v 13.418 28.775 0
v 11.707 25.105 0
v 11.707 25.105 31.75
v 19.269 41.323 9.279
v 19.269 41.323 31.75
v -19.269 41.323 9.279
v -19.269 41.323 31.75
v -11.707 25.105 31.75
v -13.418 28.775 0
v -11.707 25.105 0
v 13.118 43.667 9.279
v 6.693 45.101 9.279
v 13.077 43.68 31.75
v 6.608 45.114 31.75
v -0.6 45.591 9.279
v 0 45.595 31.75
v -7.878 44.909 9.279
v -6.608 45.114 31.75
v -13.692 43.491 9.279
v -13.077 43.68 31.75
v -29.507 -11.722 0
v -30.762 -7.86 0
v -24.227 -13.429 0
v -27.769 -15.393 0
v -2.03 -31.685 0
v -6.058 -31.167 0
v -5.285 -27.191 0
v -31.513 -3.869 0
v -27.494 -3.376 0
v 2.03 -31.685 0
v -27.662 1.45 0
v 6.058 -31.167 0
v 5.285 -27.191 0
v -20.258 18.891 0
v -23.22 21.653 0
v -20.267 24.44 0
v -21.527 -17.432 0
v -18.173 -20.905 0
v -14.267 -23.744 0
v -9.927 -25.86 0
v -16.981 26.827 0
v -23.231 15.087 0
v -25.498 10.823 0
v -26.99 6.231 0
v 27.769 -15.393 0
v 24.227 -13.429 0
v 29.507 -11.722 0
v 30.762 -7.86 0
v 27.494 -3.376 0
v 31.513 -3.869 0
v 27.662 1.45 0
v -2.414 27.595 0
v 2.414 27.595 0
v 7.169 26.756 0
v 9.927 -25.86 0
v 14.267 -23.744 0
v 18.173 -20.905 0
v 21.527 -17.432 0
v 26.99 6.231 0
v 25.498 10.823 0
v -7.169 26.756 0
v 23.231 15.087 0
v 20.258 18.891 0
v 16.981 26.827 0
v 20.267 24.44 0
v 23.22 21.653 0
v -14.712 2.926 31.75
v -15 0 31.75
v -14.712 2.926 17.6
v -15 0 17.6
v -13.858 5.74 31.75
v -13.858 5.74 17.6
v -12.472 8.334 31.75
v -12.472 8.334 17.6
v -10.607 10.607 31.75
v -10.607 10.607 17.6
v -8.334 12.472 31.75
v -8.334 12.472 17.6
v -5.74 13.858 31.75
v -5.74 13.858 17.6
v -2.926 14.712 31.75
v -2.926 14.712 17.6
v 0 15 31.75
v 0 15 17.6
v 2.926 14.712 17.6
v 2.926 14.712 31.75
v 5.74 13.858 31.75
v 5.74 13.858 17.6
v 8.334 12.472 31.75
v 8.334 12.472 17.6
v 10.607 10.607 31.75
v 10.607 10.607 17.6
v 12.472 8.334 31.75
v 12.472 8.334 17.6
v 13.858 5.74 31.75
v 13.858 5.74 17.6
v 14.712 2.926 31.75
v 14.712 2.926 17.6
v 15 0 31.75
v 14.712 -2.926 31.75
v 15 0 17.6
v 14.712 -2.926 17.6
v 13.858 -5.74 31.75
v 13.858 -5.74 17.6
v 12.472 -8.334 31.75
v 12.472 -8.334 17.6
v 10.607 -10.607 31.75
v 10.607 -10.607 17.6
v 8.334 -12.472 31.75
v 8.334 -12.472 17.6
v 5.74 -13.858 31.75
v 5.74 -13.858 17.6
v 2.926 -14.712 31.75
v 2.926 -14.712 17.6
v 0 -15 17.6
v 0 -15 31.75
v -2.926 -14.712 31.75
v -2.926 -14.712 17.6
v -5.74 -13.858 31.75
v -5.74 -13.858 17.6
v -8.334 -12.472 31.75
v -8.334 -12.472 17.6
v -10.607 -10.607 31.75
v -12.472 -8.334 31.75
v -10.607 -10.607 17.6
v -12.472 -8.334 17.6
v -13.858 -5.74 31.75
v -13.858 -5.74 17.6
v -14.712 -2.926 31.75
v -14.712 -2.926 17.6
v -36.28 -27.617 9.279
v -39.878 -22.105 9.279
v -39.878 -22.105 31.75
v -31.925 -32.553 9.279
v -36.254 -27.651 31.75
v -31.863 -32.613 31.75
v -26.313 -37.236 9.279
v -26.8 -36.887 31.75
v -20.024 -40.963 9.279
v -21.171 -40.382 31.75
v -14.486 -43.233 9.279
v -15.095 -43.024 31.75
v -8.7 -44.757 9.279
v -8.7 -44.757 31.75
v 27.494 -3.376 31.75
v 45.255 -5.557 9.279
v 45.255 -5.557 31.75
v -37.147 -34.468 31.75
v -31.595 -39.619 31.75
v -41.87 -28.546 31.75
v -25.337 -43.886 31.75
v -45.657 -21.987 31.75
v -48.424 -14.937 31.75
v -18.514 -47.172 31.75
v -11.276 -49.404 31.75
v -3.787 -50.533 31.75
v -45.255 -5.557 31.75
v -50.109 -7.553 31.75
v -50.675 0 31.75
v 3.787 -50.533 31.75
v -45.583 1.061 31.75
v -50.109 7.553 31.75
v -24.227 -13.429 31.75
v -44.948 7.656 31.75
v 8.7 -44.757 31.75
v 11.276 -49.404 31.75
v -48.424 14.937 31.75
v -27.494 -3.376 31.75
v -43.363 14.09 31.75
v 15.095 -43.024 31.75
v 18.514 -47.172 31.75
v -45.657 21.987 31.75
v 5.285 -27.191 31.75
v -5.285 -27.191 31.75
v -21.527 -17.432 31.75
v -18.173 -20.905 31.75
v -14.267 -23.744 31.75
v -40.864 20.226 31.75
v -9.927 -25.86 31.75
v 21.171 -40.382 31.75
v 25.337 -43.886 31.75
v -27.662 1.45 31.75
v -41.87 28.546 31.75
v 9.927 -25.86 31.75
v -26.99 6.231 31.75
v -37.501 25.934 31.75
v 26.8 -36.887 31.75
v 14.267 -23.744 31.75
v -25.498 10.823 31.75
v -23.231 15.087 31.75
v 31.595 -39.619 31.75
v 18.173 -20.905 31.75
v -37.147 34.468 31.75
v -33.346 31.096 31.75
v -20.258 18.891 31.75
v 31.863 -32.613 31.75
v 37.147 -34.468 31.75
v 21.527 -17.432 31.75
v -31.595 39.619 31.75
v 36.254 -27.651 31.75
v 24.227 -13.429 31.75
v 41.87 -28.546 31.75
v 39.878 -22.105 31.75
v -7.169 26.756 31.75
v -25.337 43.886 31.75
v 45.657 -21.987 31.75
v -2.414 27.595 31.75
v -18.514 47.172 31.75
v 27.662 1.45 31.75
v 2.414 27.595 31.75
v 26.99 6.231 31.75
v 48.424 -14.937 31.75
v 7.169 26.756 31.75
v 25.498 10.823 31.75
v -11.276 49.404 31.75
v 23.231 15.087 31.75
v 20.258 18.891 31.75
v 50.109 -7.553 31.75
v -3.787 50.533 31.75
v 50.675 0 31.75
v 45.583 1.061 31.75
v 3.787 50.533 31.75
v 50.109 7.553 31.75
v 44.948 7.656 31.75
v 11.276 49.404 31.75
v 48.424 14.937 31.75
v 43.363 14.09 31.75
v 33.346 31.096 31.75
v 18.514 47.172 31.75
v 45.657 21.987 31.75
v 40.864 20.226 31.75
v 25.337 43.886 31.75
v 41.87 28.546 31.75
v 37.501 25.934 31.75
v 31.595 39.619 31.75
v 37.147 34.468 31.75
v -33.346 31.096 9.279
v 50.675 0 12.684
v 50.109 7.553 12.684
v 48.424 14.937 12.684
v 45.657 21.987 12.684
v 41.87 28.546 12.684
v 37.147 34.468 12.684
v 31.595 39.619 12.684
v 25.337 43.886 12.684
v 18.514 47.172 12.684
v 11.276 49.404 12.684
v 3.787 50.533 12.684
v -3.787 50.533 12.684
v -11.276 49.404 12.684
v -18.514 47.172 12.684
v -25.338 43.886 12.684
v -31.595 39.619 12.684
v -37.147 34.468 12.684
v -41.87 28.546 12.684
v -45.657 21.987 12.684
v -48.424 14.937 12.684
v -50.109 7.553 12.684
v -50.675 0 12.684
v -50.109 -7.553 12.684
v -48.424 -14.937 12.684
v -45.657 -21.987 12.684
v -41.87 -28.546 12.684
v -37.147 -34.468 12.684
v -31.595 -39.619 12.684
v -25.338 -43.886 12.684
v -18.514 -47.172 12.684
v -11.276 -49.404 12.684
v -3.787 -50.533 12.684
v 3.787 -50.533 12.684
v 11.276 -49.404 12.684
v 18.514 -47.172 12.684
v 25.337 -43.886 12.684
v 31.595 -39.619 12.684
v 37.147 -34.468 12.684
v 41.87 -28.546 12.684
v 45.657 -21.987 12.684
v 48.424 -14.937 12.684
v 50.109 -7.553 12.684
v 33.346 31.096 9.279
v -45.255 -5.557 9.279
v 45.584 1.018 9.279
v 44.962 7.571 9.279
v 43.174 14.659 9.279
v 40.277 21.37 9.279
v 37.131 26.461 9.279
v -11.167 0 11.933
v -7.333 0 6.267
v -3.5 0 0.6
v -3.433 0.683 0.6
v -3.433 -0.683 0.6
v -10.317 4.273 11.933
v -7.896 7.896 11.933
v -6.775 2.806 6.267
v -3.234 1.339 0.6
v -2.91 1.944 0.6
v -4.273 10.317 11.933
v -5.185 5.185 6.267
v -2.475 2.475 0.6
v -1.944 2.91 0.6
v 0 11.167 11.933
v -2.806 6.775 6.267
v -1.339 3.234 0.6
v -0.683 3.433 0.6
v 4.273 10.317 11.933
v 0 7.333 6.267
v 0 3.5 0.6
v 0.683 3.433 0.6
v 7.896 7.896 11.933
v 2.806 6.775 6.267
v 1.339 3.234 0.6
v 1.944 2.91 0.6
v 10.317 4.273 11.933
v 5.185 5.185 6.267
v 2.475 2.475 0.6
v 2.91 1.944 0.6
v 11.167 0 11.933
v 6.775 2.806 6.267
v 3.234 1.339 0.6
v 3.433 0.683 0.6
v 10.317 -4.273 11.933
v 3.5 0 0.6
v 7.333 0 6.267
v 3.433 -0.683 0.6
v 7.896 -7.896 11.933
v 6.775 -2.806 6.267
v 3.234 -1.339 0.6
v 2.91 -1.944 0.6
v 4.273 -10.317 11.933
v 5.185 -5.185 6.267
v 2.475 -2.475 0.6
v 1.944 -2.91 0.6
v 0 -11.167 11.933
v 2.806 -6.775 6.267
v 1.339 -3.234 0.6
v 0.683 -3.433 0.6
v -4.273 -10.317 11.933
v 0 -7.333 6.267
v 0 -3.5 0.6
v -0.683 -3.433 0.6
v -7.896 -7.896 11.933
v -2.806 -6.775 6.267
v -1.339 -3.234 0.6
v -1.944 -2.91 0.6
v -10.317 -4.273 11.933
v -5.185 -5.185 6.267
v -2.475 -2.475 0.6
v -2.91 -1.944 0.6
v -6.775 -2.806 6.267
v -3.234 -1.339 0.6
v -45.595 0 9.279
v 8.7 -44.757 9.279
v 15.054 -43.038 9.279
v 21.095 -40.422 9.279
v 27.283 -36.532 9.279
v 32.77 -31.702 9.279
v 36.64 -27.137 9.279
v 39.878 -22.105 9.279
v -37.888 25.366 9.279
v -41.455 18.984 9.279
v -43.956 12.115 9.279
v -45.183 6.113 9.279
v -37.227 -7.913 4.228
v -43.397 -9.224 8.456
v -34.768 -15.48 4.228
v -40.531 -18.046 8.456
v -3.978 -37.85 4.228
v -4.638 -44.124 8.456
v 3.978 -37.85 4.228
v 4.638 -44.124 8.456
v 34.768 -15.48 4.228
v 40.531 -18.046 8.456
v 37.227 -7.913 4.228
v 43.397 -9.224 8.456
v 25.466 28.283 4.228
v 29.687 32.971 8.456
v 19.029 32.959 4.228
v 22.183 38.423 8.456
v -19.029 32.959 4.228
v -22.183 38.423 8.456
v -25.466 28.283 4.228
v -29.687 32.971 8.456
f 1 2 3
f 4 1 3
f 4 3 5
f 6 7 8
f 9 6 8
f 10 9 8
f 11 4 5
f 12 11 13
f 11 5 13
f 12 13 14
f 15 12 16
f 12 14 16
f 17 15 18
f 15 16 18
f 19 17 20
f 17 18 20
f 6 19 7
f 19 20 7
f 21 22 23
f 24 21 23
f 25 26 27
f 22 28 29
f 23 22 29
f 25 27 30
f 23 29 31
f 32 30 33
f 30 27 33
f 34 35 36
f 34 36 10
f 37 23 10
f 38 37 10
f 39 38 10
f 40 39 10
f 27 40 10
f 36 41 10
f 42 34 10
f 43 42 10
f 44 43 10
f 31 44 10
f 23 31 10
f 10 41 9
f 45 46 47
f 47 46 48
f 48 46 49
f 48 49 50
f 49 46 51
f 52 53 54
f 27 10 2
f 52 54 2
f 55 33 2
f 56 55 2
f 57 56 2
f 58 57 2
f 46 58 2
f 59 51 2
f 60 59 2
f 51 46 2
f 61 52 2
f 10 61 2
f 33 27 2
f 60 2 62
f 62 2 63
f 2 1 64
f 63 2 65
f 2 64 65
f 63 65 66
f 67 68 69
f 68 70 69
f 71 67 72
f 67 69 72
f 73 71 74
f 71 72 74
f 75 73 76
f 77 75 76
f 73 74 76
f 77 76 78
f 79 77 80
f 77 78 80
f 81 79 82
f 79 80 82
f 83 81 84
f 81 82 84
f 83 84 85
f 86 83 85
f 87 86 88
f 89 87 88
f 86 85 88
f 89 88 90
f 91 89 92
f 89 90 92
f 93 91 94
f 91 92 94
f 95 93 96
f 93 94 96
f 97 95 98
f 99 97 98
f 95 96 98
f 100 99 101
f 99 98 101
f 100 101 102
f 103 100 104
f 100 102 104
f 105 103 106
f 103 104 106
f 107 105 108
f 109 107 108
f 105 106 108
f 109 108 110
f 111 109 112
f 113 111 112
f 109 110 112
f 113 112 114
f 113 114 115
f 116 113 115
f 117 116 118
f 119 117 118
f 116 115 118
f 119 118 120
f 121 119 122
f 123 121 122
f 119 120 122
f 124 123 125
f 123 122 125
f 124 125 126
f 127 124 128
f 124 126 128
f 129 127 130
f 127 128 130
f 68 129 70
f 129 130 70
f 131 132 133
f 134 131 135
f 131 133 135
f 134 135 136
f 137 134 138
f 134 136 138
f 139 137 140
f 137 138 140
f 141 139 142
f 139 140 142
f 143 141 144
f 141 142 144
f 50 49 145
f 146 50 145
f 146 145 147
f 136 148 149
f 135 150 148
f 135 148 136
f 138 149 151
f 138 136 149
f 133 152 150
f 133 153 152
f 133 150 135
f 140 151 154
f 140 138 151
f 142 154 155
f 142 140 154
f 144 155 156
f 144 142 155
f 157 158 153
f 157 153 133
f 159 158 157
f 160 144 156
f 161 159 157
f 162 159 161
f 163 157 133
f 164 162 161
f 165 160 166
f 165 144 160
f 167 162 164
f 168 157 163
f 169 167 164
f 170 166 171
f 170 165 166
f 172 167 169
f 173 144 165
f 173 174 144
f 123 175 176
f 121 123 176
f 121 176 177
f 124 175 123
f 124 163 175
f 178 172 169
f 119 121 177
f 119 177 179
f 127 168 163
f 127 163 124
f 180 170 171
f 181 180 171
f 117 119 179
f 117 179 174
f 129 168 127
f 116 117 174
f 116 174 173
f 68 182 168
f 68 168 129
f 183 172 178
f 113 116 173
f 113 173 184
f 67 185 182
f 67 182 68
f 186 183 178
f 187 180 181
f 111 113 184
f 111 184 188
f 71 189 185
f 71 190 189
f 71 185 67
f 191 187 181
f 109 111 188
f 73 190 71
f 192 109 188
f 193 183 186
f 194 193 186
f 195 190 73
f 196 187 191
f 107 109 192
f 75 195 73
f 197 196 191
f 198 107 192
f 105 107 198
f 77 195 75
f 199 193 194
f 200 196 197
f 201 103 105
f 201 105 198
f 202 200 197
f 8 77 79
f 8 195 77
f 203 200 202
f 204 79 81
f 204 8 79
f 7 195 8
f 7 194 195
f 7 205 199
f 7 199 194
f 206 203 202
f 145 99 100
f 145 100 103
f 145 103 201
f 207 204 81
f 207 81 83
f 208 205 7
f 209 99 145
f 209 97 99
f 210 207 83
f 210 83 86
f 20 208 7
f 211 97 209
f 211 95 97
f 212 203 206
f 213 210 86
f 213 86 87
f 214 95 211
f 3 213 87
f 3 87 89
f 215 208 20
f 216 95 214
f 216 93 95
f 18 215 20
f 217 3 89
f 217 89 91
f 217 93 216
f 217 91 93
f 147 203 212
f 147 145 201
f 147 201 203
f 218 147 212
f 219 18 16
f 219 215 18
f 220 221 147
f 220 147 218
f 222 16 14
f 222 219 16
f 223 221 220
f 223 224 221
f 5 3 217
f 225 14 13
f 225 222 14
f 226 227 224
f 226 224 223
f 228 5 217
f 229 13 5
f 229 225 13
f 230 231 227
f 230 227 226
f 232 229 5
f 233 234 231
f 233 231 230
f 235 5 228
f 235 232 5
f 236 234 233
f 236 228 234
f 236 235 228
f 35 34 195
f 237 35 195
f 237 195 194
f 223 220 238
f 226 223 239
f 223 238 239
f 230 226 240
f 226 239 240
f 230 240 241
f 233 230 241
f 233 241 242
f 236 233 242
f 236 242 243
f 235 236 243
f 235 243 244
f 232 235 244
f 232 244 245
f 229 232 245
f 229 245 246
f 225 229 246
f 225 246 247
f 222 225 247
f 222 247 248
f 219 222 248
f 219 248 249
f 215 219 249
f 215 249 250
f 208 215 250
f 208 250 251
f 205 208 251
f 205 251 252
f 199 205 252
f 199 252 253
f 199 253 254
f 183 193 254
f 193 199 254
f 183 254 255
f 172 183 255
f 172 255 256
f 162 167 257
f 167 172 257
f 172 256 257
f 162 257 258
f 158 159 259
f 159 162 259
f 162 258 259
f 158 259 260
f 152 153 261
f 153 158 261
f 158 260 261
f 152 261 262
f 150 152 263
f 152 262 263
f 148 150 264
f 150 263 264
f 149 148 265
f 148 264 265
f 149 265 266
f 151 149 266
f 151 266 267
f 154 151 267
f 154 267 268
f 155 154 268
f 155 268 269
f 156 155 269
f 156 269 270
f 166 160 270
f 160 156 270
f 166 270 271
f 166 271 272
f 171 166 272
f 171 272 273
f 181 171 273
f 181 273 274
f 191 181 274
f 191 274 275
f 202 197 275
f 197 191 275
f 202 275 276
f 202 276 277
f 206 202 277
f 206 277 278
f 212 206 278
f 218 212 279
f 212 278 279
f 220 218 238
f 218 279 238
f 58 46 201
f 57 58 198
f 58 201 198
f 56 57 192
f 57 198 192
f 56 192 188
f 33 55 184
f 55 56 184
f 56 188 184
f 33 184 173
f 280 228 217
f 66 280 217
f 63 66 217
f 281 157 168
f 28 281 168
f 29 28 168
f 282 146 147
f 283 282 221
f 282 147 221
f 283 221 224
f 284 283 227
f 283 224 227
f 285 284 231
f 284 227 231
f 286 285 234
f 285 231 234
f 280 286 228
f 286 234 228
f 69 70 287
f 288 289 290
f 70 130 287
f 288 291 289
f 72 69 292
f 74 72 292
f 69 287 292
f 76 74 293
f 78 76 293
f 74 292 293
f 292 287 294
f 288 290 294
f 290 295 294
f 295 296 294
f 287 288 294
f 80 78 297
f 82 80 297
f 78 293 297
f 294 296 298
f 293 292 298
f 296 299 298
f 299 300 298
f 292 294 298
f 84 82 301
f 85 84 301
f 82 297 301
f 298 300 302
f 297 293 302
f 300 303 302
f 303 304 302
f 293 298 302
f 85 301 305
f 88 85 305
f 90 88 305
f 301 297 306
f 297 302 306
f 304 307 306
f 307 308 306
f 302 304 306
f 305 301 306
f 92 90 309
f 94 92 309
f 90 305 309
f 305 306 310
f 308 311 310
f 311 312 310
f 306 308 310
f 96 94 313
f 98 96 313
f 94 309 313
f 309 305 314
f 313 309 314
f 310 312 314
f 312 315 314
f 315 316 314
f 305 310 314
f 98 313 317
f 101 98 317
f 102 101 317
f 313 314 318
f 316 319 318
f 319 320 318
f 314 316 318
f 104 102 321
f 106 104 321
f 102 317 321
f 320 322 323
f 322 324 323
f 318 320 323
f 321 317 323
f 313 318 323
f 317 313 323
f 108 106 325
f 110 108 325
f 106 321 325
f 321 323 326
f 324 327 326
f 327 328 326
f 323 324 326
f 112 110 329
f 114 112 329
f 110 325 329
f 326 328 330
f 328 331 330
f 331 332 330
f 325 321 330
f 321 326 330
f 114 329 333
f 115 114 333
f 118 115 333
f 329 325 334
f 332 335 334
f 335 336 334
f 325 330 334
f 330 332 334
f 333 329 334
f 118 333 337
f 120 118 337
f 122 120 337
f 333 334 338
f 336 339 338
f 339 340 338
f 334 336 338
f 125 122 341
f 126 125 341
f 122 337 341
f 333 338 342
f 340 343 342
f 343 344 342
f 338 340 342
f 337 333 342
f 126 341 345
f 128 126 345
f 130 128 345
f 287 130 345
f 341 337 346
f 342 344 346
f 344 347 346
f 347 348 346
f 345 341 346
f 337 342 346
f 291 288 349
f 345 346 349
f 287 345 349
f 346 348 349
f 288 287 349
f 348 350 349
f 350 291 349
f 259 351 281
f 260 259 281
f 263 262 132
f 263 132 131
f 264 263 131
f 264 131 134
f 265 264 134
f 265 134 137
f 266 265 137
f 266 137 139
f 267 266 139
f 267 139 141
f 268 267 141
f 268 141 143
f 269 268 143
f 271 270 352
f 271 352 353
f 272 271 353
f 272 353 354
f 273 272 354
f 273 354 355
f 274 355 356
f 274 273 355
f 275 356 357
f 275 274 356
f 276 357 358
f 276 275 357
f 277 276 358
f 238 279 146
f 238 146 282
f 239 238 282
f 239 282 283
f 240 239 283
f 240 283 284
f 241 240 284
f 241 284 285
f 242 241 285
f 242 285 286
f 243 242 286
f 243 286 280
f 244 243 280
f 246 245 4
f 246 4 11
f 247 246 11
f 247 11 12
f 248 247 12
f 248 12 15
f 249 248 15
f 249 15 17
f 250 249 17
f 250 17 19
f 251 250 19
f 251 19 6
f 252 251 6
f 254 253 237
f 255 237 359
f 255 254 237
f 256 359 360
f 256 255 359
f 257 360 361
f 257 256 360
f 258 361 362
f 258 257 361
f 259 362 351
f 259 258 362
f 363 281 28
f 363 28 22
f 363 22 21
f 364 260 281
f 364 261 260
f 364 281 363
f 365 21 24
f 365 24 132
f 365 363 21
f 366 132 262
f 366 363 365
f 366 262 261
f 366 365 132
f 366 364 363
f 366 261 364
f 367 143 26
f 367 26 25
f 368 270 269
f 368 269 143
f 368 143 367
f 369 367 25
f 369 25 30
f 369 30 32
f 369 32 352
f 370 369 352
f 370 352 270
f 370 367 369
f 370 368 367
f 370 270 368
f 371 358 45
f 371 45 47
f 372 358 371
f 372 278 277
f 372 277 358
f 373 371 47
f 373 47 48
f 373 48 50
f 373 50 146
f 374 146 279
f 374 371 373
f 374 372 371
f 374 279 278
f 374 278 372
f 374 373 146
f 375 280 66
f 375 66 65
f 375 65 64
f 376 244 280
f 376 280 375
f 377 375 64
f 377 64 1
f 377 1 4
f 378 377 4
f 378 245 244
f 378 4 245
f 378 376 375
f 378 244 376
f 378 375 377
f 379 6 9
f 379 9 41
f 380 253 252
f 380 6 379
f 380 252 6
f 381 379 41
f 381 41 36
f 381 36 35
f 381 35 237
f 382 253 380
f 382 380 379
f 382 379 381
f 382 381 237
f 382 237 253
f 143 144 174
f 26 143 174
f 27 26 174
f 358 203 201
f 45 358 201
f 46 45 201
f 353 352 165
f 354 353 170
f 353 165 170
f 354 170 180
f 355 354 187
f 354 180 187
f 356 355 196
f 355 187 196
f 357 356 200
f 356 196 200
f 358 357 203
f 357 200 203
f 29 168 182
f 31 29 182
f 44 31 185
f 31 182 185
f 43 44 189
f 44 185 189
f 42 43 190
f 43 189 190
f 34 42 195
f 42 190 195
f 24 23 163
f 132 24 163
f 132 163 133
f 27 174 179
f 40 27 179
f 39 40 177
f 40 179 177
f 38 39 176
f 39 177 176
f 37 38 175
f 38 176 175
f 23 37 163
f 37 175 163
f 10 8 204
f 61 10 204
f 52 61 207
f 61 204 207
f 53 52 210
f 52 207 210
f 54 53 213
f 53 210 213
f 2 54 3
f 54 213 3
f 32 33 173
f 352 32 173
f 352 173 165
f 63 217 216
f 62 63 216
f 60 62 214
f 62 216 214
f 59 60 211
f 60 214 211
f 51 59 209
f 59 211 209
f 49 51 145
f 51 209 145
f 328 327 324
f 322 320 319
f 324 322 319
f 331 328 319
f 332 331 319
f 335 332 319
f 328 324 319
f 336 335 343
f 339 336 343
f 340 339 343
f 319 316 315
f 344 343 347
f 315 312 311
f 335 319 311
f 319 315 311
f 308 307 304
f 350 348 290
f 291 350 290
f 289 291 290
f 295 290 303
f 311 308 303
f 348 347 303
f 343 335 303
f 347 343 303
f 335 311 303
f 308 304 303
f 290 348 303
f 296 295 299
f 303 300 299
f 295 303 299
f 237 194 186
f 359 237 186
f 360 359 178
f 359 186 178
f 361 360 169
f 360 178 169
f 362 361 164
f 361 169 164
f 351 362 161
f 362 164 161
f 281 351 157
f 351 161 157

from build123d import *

# Parameters (mm, degrees)
F0_R      = 50.675
F1_DEPTH  = 95.25
F6_R      = 64.2548627896
F7_DEPTH  = 63.5
F10_DEPTH = 31.751


# Not quite as in the source:
# - a feature of the source that left no trace in its solid (it failed there, or was rolled back) is left out


with BuildPart() as f1:
    # F0 (on Top) → F1 (new body)
    with BuildSketch(Plane.XY):
        Circle(F0_R)
    extrude(amount=F1_DEPTH)

    # F2 (on Front) → F3 (revolve, cut)
    with BuildSketch(Plane.XZ):
        Polygon((-50.6984, 0), (-31.75, 0), (-50.6984, 12.7), align=None)
    revolve(axis=Axis((0, 0, 21.0587424167), (0, 0, 1)), mode=Mode.SUBTRACT)

    # F4 (on Front) → F5 (revolve, cut)
    with BuildSketch(Plane.XZ):
        Polygon((0, 0.6), (0, 108.2893535495), (-15, 108.2893535495), (-15, 17.6), (-3.5, 0.6), align=None)
    revolve(axis=Axis((0, 0, 54.4446767747), (0, 0, -1)), mode=Mode.SUBTRACT)

    # F6 (on face) → F7 (cut)
    with BuildSketch(Plane.XY.offset(95.25)):
        Circle(F6_R)
    extrude(amount=-F7_DEPTH, mode=Mode.SUBTRACT)

    # F9 (on face) → F10 (cut, through all)
    with BuildSketch(Plane.XY.offset(31.75)):
        with BuildLine():
            ThreePointArc((-11.7065258502, 25.1047257009), (0, 27.7), (11.7065258502, 25.1047257009))
            Line((11.7065258502, 25.1047257009), (19.2692796441, 41.3231035499))
            ThreePointArc((19.2692796441, 41.3231035499), (0, 45.595), (-19.2692796441, 41.3231035499))
            Line((-19.2692796441, 41.3231035499), (-11.7065258502, 25.1047257009))
        make_face()
        with BuildLine():
            ThreePointArc((-27.4935284005, -3.3757808123), (-26.3442655014, 8.5597707442), (-20.2584975349, 18.8913545737))
            Line((-20.2584975349, 18.8913545737), (-33.3460720253, 31.095715227))
            ThreePointArc((-33.3460720253, 31.095715227), (-43.3634218605, 14.0896298585), (-45.2551417841, -5.5566327126))
            Line((-45.2551417841, -5.5566327126), (-27.4935284005, -3.3757808123))
        make_face()
        with BuildLine():
            ThreePointArc((-5.2854091719, -27.1910729815), (-16.2816514885, -22.4097707442), (-24.2269658878, -13.4292264808))
            Line((-24.2269658878, -13.4292264808), (-39.878285547, -22.1048946351))
            ThreePointArc((-39.878285547, -22.1048946351), (-26.8000685783, -36.8871298585), (-8.6999361442, -44.7572914293))
            Line((-8.6999361442, -44.7572914293), (-5.2854091719, -27.1910729815))
        make_face()
        with BuildLine():
            ThreePointArc((24.2269658878, -13.4292264808), (16.2816514885, -22.4097707442), (5.2854091719, -27.1910729815))
            Line((5.2854091719, -27.1910729815), (8.6999361442, -44.7572914293))
            ThreePointArc((8.6999361442, -44.7572914293), (26.8000685783, -36.8871298585), (39.878285547, -22.1048946351))
            Line((39.878285547, -22.1048946351), (24.2269658878, -13.4292264808))
        make_face()
        with BuildLine():
            ThreePointArc((20.2584975349, 18.8913545737), (26.3442655014, 8.5597707442), (27.4935284005, -3.3757808123))
            Line((27.4935284005, -3.3757808123), (45.2551417841, -5.5566327126))
            ThreePointArc((45.2551417841, -5.5566327126), (43.3634218605, 14.0896298585), (33.3460720253, 31.095715227))
            Line((33.3460720253, 31.095715227), (20.2584975349, 18.8913545737))
        make_face()
    extrude(amount=-F10_DEPTH, mode=Mode.SUBTRACT)


solid = f1.part
